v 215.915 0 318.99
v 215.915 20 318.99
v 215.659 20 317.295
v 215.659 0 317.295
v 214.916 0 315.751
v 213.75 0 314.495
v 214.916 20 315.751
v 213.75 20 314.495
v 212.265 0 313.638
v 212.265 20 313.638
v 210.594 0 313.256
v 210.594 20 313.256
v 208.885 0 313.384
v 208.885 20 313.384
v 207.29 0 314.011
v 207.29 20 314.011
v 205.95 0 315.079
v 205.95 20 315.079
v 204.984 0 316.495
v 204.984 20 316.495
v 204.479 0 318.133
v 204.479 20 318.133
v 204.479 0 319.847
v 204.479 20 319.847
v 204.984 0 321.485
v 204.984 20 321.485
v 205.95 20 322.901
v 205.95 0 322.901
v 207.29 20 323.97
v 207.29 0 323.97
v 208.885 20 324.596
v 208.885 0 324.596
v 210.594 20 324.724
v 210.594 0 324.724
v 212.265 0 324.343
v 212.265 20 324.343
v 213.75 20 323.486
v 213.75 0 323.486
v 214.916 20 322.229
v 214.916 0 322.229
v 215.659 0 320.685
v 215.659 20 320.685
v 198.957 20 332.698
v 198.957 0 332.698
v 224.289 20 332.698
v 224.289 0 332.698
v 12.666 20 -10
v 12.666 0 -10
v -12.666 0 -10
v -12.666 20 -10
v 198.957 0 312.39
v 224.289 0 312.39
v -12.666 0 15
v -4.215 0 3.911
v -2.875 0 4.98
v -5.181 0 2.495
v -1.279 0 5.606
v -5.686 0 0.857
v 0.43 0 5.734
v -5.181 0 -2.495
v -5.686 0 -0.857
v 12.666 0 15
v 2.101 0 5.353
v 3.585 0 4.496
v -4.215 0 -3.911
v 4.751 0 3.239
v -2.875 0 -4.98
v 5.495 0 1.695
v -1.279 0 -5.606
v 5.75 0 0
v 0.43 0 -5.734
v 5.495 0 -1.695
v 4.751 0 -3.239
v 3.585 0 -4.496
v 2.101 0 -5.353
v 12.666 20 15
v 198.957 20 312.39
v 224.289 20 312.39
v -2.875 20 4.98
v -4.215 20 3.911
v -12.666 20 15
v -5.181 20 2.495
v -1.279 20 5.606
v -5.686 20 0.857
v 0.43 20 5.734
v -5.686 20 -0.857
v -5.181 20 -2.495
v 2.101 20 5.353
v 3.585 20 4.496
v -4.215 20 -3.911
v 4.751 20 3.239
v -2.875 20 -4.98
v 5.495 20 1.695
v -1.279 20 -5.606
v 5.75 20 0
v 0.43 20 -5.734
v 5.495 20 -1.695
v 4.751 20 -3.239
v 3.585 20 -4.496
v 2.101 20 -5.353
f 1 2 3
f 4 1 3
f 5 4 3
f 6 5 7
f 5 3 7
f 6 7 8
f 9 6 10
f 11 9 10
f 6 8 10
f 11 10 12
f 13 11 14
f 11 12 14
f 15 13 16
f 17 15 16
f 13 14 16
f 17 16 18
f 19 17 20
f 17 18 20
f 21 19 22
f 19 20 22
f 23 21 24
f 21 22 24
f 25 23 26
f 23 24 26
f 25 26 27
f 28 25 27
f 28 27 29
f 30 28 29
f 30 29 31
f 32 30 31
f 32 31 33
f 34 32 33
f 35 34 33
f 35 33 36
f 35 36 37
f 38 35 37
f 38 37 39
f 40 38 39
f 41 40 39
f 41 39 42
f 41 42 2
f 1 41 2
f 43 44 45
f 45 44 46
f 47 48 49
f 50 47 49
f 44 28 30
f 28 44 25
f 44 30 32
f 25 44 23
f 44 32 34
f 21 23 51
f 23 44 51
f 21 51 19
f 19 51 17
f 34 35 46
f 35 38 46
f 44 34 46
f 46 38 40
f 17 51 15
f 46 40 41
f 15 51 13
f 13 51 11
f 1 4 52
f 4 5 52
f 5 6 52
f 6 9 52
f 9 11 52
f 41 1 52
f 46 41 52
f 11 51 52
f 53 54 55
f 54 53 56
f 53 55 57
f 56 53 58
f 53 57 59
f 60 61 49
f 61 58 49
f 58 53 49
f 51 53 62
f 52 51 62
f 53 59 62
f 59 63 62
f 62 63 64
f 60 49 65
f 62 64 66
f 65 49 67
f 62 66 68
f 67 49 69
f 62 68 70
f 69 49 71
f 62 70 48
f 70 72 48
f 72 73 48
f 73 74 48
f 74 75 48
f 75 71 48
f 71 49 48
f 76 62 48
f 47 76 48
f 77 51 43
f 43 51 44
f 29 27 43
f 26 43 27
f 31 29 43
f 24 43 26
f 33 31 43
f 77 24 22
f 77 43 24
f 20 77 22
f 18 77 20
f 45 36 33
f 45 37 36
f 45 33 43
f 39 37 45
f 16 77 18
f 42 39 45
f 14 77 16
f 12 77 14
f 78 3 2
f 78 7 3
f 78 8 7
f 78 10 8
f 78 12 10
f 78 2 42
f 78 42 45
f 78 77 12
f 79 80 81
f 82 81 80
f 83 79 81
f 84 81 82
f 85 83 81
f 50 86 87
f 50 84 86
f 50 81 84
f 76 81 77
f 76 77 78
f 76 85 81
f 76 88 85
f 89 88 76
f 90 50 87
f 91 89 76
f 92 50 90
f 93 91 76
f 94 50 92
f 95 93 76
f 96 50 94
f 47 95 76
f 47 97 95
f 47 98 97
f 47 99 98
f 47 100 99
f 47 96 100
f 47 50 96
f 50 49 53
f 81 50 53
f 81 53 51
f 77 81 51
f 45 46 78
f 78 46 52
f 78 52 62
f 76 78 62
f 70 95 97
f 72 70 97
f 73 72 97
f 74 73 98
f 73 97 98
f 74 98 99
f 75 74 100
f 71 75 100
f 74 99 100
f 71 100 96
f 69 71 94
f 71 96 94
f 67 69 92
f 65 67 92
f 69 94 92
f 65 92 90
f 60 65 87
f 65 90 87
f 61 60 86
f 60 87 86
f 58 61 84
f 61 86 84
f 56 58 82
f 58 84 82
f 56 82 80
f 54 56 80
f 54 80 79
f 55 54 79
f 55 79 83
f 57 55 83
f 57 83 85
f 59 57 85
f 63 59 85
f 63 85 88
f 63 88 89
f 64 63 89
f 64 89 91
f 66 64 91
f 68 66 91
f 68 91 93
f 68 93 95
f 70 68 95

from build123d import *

# Parameters (mm, degrees)
BOSS_EXTRUDE2_DEPTH = 20
SKETCH3_R           = 5.75
CUT_EXTRUDE1_DEPTH  = 21


with BuildPart() as part:
    # Sketch2 → Boss-Extrude2 (new body)
    with BuildSketch(Plane(origin=(0, 0, 0), x_dir=(1, 0, 0), z_dir=(0, 1, 0))):
        Polygon((-12.666179626, 10), (-12.666179626, -15), (198.957090302, -312.389629316), (198.957090302, -332.698194406), (224.289449554, -332.698194406), (224.289449554, -312.389629316), (12.666179626, -15), (12.666179626, 10), align=None)
    extrude(amount=BOSS_EXTRUDE2_DEPTH)

    # Sketch3 → Cut-Extrude1 (cut, through all)
    with BuildSketch(Plane(origin=(0, 20, 0), x_dir=(1, 0, 0), z_dir=(0, 1, 0))):
        Circle(SKETCH3_R)
        with Locations((210.164682847, -318.99029152)):
            Circle(SKETCH3_R)
    extrude(amount=-CUT_EXTRUDE1_DEPTH, mode=Mode.SUBTRACT)


solid = part.part
